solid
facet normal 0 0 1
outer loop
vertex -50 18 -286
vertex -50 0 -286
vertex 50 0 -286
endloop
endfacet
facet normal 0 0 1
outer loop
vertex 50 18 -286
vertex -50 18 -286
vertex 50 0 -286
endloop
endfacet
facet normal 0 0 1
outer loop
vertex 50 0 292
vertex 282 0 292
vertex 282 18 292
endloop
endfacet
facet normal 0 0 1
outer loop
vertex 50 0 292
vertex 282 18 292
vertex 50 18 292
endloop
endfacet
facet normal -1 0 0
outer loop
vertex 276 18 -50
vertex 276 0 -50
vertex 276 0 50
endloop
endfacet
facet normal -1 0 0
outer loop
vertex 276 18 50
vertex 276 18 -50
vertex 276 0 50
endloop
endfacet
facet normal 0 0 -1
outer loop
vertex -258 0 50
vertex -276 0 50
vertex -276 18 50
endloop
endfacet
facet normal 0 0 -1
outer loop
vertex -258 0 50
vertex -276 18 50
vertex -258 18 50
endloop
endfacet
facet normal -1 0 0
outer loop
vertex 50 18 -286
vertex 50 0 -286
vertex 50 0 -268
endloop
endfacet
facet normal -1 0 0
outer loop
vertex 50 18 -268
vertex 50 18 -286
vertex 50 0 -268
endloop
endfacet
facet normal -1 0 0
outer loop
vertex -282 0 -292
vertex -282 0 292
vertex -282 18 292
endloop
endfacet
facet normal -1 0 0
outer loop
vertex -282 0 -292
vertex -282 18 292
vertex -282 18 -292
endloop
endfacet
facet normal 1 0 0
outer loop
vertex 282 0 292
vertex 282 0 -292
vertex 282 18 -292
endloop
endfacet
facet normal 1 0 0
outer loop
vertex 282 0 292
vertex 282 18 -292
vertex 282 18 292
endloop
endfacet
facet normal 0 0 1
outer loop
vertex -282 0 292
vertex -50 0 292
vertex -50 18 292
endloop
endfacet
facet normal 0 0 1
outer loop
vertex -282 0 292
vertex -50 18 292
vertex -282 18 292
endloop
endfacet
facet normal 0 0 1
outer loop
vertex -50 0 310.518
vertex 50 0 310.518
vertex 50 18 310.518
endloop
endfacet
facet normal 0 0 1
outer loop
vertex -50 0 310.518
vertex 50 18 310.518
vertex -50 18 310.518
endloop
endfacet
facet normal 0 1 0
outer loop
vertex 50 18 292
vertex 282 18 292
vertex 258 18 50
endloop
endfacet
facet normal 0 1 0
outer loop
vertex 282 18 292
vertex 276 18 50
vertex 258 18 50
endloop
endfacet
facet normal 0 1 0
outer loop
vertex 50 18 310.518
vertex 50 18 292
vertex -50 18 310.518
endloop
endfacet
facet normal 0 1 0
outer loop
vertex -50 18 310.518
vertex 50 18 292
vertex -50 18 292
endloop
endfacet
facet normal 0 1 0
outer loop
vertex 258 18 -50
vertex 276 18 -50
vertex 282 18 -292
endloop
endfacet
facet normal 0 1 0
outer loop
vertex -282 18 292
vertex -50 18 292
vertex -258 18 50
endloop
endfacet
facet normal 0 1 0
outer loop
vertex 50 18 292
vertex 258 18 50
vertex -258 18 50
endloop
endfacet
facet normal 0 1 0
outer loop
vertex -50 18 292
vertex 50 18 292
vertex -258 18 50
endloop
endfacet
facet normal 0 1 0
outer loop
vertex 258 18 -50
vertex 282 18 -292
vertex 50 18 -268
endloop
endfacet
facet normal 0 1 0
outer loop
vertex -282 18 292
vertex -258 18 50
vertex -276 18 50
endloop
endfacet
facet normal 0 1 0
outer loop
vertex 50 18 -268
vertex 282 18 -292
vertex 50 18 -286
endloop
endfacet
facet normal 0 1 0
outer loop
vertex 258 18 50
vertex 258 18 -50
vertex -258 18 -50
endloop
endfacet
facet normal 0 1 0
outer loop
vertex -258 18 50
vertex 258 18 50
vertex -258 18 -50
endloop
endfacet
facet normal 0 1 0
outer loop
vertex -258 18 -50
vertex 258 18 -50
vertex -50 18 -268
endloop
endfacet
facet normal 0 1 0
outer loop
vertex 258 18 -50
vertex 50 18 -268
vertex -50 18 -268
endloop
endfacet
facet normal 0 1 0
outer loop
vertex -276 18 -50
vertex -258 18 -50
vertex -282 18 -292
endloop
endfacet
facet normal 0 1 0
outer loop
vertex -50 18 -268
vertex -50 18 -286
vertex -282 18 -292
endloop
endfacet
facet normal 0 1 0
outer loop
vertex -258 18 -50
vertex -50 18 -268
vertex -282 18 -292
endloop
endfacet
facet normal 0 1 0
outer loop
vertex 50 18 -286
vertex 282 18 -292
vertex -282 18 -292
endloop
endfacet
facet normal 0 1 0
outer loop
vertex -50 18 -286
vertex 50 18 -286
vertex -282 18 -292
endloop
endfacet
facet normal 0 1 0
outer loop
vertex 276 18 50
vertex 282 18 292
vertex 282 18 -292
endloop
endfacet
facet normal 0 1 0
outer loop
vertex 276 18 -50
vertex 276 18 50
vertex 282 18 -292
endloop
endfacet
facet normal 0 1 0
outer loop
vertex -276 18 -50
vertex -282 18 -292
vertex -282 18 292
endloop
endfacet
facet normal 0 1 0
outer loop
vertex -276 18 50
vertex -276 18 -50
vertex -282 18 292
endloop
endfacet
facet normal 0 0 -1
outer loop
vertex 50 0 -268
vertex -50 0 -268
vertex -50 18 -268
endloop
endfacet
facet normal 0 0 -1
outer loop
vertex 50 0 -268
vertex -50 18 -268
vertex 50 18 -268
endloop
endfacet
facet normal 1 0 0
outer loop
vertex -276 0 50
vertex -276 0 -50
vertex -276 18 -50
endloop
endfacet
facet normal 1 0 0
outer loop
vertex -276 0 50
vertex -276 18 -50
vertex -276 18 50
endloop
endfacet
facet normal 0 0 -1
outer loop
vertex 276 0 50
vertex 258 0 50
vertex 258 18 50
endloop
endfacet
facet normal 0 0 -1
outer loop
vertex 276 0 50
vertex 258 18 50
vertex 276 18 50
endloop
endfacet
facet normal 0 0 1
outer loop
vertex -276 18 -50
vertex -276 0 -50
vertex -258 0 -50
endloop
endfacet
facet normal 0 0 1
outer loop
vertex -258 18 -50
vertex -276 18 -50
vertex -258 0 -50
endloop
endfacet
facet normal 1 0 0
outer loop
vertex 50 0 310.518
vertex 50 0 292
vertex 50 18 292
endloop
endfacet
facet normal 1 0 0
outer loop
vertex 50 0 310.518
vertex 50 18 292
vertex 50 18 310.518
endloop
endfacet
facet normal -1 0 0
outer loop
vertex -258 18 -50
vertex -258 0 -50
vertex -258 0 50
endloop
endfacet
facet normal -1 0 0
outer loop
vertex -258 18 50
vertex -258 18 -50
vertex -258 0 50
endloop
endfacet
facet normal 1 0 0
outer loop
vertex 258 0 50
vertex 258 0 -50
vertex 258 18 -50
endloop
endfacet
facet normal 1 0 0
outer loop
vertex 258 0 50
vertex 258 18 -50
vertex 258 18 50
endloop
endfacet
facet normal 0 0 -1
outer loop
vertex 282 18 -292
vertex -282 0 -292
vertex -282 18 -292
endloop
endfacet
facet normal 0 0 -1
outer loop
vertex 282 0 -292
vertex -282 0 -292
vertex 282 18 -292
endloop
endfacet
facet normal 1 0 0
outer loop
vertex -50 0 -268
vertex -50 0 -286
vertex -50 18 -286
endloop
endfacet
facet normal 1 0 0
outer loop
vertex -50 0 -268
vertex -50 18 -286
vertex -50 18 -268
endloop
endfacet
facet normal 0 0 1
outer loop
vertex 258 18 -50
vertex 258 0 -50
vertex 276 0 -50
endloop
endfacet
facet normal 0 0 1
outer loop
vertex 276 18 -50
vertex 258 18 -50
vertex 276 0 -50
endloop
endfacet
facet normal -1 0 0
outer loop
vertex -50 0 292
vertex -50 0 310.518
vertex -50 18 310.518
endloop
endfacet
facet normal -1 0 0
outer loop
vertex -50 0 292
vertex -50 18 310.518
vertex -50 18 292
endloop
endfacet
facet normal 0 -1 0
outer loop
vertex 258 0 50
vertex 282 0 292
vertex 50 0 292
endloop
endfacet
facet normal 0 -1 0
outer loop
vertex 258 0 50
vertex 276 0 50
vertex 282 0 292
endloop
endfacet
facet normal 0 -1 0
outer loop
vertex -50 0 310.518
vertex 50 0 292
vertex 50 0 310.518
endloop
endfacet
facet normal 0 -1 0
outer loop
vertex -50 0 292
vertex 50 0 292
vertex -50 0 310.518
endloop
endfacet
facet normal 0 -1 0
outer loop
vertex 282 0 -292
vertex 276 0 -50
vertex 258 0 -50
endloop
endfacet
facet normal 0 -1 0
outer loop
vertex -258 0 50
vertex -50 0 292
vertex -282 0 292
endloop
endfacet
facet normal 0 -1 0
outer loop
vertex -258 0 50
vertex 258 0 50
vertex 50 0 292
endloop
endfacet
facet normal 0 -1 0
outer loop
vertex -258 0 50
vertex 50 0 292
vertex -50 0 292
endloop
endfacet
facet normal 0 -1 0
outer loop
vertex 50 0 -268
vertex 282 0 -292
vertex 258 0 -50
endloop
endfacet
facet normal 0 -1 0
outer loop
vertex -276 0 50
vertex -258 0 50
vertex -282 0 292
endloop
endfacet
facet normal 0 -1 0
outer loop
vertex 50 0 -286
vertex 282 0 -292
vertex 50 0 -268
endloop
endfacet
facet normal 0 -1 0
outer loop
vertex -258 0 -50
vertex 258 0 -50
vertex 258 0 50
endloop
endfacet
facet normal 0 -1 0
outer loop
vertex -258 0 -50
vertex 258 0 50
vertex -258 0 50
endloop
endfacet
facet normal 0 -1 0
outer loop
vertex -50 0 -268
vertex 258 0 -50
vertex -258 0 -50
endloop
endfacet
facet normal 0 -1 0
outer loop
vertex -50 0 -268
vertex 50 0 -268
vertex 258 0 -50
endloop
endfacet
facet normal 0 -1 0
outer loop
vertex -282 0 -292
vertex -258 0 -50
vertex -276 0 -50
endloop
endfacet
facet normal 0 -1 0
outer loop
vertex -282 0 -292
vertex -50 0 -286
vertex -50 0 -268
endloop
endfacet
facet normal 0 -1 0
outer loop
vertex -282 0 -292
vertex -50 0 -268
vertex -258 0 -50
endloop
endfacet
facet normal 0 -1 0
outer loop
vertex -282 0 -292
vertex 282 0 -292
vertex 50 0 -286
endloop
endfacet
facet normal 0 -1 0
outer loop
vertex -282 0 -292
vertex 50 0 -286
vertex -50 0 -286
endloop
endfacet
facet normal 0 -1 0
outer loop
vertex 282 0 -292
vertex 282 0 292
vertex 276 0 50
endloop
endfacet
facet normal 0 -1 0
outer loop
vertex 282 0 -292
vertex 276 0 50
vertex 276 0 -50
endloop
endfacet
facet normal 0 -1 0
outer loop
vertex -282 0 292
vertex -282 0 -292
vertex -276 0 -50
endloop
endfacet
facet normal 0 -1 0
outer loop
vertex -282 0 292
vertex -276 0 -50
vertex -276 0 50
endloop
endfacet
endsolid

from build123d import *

# Parameters (mm, degrees)
BOSS_EXTRUDE2_DEPTH = 18
SKETCH2_W           = 18
SKETCH2_H           = 100
CUT_EXTRUDE1_DEPTH  = 18
SKETCH3_W           = 100
SKETCH3_H           = 18
CUT_EXTRUDE2_DEPTH  = 18


with BuildPart() as part:
    # Sketch1 → Boss-Extrude2 (new body)
    with BuildSketch(Plane(origin=(0, 0, 0), x_dir=(1, 0, 0), z_dir=(0, 1, 0))):
        Polygon((-282, 292), (282, 292), (282, -292), (50, -292), (50, -310.517979904), (-50, -310.517979904), (-50, -292), (-282, -292), align=None)
    extrude(amount=BOSS_EXTRUDE2_DEPTH)

    # Sketch2 → Cut-Extrude1 (cut)
    with BuildSketch(Plane.XZ):
        with Locations((267, 0)):
            Rectangle(SKETCH2_W, SKETCH2_H)
        with Locations((-267, 0)):
            Rectangle(SKETCH2_W, SKETCH2_H)
    extrude(amount=-CUT_EXTRUDE1_DEPTH, mode=Mode.SUBTRACT)

    # Sketch3 → Cut-Extrude2 (cut)
    with BuildSketch(Plane.XZ):
        with Locations((0, -277)):
            Rectangle(SKETCH3_W, SKETCH3_H)
    extrude(amount=-CUT_EXTRUDE2_DEPTH, mode=Mode.SUBTRACT)


solid = part.part
